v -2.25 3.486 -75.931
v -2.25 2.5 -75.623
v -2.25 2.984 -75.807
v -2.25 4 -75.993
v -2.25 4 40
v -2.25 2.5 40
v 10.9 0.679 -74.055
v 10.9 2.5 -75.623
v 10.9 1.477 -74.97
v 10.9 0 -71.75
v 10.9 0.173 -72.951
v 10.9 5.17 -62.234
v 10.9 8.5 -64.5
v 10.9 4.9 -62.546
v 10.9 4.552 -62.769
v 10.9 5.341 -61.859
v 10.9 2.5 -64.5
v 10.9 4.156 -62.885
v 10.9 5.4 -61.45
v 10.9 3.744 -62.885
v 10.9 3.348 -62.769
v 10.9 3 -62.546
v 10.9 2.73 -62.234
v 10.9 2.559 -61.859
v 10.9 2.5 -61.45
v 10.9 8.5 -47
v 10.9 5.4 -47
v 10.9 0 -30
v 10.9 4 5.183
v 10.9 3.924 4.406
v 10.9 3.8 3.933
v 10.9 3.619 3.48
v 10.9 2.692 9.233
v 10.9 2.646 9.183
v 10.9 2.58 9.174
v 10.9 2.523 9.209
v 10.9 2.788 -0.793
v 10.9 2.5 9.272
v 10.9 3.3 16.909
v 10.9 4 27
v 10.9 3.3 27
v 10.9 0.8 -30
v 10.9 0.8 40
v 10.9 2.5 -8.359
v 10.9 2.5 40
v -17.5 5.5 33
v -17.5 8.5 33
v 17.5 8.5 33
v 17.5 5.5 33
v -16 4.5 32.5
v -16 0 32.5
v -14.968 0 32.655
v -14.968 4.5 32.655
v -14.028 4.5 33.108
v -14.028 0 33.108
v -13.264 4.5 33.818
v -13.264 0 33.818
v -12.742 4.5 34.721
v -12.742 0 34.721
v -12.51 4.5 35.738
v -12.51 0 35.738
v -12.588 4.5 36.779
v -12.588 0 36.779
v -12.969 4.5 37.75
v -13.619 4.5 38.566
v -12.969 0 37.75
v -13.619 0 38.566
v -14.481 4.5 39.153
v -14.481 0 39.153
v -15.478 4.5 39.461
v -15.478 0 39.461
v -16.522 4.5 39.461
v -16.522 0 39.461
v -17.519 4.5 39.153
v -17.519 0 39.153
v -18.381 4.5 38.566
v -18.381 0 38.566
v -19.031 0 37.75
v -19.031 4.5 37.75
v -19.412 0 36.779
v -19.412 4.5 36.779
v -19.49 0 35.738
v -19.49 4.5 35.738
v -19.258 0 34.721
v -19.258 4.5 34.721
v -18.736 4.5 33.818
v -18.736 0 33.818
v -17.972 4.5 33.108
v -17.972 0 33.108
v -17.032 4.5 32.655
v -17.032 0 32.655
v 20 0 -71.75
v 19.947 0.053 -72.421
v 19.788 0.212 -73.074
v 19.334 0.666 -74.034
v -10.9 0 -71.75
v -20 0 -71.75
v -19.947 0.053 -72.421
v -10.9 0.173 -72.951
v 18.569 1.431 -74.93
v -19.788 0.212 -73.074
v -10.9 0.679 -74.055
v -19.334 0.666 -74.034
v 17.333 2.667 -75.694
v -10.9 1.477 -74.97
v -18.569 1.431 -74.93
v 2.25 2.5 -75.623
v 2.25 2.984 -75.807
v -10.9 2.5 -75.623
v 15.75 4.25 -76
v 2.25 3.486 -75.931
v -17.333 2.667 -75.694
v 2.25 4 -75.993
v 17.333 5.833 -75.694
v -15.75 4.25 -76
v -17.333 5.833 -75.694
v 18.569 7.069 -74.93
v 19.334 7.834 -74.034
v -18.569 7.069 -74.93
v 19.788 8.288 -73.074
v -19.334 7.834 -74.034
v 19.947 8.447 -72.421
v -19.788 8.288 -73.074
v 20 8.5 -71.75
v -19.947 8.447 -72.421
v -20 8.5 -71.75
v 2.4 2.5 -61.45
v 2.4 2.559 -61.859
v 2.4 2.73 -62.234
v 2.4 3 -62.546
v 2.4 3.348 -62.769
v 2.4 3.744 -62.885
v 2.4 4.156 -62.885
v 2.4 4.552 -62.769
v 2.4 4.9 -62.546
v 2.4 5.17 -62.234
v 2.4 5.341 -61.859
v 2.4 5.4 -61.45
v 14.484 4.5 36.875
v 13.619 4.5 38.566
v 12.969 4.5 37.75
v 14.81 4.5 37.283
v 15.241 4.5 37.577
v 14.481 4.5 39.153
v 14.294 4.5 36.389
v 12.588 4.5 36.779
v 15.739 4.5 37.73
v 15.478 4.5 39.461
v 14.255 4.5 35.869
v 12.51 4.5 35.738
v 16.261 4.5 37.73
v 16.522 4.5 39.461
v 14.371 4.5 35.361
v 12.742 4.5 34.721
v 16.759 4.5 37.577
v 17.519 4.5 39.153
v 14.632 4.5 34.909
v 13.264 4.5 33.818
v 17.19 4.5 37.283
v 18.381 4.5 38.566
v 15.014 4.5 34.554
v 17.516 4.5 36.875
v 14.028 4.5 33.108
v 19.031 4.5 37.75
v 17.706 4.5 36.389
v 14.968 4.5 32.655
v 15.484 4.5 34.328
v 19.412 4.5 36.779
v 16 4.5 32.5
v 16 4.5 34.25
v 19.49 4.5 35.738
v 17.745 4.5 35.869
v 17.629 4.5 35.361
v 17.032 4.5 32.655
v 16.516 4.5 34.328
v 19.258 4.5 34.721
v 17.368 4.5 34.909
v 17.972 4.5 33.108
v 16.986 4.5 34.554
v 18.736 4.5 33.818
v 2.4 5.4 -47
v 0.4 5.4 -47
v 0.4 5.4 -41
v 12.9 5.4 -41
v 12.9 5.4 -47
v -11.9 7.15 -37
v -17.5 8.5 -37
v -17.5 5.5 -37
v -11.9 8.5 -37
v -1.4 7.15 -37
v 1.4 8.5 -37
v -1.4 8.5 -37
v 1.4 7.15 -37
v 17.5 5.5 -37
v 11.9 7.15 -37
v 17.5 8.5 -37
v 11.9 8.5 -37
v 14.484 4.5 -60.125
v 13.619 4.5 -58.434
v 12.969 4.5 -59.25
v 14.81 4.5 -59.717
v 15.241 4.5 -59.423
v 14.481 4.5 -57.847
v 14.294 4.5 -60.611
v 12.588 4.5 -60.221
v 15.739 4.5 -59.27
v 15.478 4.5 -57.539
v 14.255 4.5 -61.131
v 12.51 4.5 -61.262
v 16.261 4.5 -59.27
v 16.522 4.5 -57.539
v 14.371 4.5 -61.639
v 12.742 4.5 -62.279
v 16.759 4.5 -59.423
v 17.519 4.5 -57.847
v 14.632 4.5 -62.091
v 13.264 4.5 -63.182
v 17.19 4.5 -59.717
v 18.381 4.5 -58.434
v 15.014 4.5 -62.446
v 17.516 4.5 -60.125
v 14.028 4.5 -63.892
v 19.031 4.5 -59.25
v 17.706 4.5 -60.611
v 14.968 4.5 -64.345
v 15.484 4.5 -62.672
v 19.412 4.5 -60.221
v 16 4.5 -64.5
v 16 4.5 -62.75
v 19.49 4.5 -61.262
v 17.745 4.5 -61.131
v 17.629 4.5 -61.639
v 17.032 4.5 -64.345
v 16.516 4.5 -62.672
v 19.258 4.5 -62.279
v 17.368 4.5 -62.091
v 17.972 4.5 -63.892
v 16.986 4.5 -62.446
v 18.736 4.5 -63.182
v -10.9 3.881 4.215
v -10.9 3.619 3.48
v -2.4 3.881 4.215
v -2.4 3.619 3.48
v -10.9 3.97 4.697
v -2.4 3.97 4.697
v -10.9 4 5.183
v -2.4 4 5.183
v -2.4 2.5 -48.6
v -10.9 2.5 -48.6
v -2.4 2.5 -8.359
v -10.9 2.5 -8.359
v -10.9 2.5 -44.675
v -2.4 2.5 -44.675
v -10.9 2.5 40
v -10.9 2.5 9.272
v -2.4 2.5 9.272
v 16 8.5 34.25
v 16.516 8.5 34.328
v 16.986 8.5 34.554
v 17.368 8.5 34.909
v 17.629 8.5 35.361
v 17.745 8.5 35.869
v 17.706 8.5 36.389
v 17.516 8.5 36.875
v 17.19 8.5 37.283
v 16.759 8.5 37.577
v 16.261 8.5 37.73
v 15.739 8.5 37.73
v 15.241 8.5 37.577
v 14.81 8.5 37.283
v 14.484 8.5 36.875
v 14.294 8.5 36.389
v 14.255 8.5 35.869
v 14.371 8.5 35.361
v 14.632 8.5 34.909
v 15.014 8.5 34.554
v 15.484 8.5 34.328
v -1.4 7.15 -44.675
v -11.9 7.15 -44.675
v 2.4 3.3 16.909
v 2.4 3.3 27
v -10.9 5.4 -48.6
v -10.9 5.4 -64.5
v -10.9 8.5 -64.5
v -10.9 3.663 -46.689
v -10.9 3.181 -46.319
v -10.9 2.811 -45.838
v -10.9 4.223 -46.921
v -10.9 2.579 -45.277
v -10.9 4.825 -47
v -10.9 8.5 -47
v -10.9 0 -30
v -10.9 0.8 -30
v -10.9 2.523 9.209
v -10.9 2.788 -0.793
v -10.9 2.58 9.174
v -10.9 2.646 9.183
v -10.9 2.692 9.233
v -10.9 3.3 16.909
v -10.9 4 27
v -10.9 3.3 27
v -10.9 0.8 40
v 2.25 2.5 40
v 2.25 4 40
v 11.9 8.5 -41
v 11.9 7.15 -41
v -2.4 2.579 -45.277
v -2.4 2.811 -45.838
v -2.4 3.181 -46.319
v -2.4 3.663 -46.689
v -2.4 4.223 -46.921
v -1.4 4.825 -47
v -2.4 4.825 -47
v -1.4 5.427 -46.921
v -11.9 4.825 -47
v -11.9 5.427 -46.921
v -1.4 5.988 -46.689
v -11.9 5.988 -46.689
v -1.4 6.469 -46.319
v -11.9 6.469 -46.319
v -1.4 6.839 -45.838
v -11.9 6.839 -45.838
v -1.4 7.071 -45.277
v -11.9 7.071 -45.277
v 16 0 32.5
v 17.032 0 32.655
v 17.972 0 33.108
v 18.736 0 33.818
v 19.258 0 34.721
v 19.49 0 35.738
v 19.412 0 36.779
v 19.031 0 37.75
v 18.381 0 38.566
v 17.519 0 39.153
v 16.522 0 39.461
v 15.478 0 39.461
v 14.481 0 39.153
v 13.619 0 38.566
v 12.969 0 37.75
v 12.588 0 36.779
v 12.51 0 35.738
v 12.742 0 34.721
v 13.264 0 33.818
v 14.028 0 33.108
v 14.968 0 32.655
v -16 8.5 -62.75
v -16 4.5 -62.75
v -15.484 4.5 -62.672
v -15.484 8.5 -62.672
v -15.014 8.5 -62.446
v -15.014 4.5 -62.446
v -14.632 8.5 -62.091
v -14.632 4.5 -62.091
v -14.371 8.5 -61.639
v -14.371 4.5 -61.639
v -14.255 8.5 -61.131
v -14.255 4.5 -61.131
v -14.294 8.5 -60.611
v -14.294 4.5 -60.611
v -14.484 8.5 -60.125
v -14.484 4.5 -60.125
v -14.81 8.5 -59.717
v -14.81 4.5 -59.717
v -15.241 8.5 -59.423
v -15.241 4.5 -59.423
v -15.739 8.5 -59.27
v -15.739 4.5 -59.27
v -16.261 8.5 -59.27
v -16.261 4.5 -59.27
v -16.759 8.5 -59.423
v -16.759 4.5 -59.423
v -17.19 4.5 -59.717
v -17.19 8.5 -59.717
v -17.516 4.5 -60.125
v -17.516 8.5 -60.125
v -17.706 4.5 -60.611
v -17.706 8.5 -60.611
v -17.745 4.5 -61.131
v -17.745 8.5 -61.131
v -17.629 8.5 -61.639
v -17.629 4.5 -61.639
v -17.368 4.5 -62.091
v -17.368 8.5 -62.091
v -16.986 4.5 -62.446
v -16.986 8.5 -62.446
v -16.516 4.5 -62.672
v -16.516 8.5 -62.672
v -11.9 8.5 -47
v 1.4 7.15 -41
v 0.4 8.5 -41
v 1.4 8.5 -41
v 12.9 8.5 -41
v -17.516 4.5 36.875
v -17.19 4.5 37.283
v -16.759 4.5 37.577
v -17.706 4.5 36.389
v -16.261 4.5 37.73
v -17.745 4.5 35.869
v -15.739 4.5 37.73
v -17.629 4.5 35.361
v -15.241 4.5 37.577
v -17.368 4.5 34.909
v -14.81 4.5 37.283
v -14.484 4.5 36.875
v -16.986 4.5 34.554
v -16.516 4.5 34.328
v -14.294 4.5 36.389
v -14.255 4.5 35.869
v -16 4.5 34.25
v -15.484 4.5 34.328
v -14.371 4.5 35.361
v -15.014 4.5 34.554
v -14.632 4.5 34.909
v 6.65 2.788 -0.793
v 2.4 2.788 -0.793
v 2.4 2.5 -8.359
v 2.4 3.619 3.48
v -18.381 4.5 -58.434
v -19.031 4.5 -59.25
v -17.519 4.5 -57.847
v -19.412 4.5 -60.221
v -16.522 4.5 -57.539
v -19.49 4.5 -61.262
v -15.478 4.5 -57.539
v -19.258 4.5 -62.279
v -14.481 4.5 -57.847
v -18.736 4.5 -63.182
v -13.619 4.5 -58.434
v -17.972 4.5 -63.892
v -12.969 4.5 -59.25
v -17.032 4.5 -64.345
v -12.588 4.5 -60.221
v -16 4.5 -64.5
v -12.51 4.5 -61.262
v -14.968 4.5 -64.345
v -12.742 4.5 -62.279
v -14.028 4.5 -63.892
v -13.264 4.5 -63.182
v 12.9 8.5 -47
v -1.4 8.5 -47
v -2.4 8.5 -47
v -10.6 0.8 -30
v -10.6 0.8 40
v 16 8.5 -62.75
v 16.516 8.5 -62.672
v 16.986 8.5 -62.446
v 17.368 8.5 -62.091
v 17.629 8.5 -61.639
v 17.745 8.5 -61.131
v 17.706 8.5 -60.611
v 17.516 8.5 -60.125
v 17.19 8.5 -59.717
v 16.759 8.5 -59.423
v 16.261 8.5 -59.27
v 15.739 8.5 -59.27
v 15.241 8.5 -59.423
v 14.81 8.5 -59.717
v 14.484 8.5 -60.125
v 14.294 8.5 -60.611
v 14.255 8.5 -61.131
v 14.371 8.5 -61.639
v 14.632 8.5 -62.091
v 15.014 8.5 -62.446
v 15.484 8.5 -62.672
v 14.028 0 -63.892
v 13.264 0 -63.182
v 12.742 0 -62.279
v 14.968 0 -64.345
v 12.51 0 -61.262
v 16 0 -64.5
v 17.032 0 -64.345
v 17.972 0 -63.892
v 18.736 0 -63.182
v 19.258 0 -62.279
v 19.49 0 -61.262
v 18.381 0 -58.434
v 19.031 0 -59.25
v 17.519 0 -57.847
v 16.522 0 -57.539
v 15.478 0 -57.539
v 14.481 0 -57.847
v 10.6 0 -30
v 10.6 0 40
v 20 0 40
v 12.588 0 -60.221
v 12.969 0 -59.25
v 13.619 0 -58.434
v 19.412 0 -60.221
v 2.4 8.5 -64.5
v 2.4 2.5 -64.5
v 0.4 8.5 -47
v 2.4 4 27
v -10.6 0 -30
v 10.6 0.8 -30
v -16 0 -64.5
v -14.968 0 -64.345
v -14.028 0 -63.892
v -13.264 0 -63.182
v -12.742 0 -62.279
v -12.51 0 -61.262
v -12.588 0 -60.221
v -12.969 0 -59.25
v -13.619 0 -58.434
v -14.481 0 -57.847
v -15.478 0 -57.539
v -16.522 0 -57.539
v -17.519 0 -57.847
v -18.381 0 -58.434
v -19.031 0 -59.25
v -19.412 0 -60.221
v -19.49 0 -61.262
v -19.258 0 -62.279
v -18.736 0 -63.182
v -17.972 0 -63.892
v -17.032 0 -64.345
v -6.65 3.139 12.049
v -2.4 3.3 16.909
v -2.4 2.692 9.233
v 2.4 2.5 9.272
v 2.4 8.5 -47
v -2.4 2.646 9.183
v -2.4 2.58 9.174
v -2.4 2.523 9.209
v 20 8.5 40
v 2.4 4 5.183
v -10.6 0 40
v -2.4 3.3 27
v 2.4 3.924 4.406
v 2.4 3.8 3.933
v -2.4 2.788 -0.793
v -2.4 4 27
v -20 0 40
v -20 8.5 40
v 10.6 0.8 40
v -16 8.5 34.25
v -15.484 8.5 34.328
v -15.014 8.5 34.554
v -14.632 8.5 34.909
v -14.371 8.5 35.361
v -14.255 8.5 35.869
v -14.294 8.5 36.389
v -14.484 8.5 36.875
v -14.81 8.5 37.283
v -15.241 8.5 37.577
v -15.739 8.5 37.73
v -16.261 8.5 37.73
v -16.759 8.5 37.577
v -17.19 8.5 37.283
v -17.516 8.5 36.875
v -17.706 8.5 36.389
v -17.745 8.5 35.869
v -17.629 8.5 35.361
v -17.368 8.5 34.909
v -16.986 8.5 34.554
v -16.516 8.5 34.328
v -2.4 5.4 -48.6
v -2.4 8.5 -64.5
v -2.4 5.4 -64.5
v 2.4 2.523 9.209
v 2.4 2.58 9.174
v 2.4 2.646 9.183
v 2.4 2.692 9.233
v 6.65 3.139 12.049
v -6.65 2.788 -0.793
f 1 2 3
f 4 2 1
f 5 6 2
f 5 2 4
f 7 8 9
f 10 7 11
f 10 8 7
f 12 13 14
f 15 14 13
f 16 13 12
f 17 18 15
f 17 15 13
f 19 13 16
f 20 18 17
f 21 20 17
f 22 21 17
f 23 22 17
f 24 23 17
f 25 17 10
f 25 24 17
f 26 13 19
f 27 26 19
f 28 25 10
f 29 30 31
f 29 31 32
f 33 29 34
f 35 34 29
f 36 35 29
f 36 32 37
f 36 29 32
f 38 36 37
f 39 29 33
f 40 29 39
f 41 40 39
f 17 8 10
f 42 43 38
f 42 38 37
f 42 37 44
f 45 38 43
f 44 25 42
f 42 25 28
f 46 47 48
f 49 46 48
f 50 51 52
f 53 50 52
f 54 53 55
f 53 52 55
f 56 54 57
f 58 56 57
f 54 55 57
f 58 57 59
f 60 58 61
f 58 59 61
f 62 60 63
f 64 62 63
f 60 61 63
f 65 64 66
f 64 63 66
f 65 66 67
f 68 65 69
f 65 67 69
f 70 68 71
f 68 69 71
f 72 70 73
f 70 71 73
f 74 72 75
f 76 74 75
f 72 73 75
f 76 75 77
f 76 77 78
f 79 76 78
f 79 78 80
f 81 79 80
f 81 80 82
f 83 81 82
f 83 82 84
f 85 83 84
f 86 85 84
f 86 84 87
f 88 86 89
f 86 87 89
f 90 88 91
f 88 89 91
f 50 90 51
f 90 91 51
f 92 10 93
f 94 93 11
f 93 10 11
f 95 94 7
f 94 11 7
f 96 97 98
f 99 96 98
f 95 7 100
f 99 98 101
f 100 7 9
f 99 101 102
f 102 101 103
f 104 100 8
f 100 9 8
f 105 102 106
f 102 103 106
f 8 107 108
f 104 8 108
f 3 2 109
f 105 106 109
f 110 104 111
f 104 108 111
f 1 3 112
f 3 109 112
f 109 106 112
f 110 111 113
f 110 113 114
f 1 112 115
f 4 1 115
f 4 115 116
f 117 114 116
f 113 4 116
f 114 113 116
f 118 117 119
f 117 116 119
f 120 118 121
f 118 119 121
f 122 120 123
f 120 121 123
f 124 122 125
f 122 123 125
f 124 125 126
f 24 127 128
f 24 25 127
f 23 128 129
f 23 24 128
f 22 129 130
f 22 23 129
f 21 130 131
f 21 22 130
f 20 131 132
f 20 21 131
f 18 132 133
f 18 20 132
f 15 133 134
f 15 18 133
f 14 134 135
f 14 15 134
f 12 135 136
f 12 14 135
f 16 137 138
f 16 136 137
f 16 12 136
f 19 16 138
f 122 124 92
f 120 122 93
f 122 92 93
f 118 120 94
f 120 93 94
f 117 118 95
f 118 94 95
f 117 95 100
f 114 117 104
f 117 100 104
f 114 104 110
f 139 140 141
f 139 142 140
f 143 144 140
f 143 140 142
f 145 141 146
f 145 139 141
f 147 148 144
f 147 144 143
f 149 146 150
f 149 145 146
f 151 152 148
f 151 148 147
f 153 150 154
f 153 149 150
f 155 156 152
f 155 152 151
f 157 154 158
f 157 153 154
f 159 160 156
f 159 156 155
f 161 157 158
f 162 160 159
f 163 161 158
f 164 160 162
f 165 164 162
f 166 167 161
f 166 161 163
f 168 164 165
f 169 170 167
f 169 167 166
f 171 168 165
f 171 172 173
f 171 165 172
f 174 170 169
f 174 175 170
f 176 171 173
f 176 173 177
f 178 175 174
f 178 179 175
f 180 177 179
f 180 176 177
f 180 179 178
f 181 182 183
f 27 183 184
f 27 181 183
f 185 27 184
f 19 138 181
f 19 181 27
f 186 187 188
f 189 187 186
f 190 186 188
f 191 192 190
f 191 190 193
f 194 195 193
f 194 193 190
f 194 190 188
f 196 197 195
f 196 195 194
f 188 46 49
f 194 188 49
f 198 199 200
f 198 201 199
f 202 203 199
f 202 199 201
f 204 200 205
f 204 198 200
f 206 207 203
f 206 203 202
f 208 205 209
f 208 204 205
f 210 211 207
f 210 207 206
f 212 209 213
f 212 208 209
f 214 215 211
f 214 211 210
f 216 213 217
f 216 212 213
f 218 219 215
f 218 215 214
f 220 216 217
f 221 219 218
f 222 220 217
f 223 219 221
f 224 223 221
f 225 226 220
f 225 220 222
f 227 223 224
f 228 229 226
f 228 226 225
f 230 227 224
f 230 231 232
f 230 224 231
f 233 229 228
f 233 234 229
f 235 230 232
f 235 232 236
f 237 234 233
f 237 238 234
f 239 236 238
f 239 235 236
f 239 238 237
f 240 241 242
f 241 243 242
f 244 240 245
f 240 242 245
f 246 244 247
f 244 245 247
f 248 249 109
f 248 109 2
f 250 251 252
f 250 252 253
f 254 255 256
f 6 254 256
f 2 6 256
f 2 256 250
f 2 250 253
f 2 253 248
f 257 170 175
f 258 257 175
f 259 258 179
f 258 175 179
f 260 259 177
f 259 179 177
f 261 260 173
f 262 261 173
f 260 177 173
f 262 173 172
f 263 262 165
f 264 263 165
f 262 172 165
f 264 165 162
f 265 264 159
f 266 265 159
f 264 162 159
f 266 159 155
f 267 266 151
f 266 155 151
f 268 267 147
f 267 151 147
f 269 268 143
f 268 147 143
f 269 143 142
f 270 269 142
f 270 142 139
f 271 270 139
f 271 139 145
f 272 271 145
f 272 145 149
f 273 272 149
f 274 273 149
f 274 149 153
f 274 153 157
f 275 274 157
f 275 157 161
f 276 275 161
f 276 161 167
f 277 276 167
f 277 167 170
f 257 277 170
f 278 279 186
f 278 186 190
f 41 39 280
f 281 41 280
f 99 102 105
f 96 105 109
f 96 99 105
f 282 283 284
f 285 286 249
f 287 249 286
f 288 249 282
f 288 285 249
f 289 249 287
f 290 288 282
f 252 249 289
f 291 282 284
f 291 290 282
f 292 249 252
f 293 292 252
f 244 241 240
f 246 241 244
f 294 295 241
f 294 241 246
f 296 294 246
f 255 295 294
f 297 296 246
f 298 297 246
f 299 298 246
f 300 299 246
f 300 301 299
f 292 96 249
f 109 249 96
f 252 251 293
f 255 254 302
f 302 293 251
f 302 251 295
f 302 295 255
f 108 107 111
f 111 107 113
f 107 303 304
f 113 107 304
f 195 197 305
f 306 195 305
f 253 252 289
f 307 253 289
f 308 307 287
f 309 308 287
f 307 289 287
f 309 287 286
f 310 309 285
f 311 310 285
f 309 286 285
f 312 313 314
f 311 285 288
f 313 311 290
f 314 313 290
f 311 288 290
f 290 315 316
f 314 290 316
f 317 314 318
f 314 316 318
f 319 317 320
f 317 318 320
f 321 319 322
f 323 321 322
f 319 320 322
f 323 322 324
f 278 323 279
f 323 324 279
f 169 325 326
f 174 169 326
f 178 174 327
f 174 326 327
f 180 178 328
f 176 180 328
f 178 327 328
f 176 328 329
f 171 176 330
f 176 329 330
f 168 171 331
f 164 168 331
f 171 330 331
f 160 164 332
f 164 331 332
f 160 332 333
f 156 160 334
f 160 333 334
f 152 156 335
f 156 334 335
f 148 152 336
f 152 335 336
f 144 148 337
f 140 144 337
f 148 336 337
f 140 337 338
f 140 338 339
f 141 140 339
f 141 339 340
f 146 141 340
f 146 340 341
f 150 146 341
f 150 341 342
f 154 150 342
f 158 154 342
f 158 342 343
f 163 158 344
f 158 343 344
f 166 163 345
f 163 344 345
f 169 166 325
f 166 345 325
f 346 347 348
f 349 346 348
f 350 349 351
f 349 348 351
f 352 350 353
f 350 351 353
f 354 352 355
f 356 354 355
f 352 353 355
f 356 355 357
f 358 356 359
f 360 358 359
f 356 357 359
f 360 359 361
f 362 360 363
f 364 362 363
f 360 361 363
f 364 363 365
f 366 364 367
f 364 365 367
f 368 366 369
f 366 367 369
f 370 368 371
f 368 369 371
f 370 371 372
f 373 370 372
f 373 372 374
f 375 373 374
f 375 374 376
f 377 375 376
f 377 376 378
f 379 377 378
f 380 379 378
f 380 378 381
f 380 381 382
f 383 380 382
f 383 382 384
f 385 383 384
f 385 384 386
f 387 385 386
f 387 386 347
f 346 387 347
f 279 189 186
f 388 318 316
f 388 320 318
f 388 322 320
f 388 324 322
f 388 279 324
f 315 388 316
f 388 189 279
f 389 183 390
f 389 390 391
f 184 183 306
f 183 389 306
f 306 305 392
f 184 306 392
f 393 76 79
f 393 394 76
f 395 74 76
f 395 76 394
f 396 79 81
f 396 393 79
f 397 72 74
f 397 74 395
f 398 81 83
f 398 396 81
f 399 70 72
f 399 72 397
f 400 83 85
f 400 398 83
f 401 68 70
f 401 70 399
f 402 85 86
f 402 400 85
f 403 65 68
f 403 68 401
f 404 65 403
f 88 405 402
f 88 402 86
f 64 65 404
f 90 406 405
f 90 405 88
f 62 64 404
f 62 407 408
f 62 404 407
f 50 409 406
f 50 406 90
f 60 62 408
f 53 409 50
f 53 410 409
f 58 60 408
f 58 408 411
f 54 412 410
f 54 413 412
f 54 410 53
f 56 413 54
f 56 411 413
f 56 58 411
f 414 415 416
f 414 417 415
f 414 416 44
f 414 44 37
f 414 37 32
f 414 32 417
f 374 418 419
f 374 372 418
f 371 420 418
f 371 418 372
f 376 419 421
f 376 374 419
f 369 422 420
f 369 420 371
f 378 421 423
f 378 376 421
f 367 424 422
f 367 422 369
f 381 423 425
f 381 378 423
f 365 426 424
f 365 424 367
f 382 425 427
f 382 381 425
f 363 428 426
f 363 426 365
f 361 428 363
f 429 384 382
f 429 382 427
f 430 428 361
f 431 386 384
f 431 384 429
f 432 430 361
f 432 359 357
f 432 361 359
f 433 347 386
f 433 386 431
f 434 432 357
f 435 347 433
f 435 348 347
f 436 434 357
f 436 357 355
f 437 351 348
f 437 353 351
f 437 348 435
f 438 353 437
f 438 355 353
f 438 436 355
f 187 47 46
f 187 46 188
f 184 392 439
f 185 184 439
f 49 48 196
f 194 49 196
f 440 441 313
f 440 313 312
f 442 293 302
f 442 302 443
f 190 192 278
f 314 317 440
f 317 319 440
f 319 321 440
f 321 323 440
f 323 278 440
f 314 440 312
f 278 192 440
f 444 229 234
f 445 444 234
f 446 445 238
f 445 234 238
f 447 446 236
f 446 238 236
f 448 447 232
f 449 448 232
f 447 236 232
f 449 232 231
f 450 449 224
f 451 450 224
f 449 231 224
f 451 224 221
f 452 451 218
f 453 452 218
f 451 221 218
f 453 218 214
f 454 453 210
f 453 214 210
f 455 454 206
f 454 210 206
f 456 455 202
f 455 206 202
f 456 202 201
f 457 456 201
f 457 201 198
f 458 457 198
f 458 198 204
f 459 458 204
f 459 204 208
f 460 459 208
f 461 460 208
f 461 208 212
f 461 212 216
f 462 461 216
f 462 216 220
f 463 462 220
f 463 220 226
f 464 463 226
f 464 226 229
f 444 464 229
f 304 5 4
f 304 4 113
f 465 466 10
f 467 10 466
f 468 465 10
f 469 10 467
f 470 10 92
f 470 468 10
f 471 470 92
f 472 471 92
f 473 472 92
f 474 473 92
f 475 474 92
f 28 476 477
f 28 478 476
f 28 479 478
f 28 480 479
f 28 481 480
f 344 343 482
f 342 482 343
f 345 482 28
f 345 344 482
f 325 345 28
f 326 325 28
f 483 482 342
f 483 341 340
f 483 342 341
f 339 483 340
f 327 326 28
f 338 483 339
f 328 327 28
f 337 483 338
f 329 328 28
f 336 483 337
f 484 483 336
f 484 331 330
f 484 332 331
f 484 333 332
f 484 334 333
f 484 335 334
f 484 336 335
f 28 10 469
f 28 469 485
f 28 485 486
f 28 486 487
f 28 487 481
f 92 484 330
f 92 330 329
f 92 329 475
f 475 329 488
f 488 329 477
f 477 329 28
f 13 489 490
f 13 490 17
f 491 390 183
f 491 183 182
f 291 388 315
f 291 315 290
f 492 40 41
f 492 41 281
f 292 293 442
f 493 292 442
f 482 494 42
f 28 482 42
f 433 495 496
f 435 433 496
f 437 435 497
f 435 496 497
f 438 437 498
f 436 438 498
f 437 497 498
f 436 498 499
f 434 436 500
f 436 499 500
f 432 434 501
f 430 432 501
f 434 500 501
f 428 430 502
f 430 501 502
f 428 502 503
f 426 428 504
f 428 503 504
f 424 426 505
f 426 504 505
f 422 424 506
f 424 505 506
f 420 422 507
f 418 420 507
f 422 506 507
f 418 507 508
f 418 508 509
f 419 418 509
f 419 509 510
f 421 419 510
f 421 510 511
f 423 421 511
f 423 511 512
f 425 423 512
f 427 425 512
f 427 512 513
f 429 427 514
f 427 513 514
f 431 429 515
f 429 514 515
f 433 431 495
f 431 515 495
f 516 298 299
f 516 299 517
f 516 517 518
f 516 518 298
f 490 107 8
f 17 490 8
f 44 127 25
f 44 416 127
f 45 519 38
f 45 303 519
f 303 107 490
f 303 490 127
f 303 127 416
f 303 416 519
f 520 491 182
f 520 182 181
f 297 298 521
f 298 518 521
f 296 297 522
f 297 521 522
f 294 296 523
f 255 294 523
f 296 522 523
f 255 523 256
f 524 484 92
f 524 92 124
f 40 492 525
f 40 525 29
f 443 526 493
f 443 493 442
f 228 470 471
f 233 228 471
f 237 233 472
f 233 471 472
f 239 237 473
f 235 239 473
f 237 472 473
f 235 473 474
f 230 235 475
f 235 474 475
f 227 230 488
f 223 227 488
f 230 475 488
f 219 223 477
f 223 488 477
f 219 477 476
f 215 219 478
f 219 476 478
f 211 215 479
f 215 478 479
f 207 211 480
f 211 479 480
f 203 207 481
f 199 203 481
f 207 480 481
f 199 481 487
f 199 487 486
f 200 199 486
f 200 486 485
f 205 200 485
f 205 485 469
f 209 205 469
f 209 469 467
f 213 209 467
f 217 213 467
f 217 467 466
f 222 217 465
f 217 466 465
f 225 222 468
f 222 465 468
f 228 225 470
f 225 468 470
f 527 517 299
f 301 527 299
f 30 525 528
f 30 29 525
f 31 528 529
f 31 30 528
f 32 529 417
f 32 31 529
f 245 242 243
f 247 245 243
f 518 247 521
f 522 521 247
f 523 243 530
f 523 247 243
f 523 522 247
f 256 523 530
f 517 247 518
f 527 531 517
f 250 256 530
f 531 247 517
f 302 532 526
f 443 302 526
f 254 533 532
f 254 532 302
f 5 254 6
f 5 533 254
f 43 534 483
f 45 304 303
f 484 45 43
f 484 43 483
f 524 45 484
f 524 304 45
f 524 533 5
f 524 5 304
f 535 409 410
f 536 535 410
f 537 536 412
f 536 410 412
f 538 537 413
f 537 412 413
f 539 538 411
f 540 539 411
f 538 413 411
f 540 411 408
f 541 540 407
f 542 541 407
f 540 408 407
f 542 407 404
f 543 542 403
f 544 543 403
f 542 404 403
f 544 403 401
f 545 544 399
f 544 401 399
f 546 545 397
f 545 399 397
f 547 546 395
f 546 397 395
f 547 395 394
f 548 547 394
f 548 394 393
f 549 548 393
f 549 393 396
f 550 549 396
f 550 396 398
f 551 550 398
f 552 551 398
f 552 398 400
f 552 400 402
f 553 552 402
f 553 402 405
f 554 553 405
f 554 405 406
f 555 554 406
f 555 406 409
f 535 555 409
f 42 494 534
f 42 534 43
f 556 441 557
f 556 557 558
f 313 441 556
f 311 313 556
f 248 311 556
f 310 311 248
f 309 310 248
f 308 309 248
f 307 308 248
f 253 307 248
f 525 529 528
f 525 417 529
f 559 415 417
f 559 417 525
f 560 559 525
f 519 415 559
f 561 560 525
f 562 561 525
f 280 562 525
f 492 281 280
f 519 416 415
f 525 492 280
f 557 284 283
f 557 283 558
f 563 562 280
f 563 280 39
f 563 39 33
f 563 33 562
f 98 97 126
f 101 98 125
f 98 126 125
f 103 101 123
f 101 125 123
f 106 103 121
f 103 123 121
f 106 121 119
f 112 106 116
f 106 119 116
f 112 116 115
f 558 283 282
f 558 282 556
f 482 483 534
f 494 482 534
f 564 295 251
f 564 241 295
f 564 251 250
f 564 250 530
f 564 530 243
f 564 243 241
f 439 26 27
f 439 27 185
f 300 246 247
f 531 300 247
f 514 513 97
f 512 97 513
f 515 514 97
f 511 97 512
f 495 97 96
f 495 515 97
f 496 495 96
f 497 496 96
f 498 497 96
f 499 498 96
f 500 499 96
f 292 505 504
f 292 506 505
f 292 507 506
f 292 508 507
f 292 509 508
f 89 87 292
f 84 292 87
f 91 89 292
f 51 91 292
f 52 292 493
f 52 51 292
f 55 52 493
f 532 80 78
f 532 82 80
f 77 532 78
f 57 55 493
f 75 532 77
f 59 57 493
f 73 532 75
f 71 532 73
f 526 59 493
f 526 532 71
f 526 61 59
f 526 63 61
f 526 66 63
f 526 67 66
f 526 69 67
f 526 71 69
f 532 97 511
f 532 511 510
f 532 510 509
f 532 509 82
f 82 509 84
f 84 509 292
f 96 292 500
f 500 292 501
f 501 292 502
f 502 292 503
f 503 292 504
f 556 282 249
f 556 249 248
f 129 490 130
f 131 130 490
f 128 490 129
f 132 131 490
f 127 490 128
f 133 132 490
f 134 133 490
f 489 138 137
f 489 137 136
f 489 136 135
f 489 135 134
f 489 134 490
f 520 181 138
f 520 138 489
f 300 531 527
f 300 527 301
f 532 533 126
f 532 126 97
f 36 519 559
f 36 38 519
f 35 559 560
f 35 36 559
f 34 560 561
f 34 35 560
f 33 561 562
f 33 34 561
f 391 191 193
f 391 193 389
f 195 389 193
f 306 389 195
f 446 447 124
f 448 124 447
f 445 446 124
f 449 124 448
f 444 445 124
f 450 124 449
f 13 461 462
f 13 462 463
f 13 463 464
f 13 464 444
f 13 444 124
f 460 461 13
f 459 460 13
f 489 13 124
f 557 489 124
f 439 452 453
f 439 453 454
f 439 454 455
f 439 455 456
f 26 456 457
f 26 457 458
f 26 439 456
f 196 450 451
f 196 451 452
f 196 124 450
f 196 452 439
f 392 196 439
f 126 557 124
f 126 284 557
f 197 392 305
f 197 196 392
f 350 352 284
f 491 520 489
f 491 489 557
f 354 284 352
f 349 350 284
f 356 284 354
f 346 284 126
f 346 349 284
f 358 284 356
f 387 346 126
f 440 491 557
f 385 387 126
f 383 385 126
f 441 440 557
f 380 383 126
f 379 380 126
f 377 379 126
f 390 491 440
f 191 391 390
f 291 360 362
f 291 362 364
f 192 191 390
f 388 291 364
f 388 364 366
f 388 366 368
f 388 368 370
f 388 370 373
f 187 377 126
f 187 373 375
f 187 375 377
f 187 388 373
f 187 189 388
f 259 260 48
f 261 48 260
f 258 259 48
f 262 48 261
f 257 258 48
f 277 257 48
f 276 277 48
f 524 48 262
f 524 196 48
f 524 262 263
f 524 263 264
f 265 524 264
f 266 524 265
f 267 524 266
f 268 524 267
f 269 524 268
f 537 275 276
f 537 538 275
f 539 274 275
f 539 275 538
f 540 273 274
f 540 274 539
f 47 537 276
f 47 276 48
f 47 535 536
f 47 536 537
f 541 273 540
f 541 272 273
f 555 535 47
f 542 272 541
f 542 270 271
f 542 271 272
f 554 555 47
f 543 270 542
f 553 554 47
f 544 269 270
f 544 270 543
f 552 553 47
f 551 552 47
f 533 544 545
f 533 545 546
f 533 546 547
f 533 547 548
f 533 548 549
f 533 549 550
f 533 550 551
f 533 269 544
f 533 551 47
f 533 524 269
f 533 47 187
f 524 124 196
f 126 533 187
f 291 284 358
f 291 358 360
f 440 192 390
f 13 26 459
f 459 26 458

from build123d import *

# Parameters (mm, degrees)
SKETCH1_W                  = 40
SKETCH1_H                  = 106
BOSS_EXTRUDE1_DEPTH        = 8.5
SKETCH2_W                  = 35
SKETCH2_H                  = 70
CUT_EXTRUDE1_DEPTH         = 3
SKETCH3_W                  = 10.5
SKETCH3_H                  = 10
CUT_EXTRUDE2_DEPTH         = 1.35
SKETCH4_W                  = 12.5
SKETCH4_H                  = 6
CUT_EXTRUDE3_DEPTH         = 3.1
SKETCH5_W                  = 8.5
SKETCH5_H                  = 17.5
PCB_PLACE_DEPTH            = 3.1
SKETCH6_W                  = 8.5
SKETCH6_H                  = 1.6
NICKEL_STRIP_HOLE_DEPTH    = 70.174850921
CUT_EXTRUDE4_REACH         = 71.486
SKETCH7_W                  = 8.5
SKETCH7_H                  = 17.5
SKETCH8_W                  = 8.5
SKETCH8_H                  = 1.6
CUT_EXTRUDE5_DEPTH         = 10
SKETCH9_W                  = 8.5
SKETCH9_H                  = 106
NICKEL_STRIP_RAIL_DEPTH    = 2.5
FILLET3_R                  = 2.325
FILLET4_RADIUS             = 1.45
FILLET4_LENGTH             = 8.5
SKETCH10_W                 = 8.5
SKETCH10_H                 = 5
CUT_EXTRUDE6_DEPTH         = 1.5
SKETCH11_W                 = 8.5
SKETCH11_H                 = 0.7
NICKELSTRIPINSERTION_DEPTH = 18
FILLET5_INSERTION_START    = -10.9
FILLET5_INSERTION_DEPTH    = 8.5
FILLET5_INSERTION_START_2  = 2.4
FILLET5_INSERTION_2_DEPTH  = 8.5
FILLET7_AMEND_R            = 4
FILLET6_START              = -10.9
FILLET6_DEPTH              = 8.5
FILLET6_START_2            = 2.4
FILLET6_2_DEPTH            = 8.5
FILLET8_ROUNDING_R         = 0.1
SKETCH12_W                 = 0.3
SKETCH12_H                 = 0.8
STRIPRAIL_DEPTH            = 70
SKETCH13_R                 = 1.75
SCREW_HOLES_DEPTH          = 70.485610128
SKETCH14_R                 = 3.5
SCREW_HEAD_HOLES_TBM_DEPTH = 4.5
BOSS_EXTRUDE2_DEPTH        = 10
FILLET9_R                  = 4.25
CUT_EXTRUDE7_REACH         = 120.018
SKETCH17_W                 = 4.5
SKETCH17_H                 = 4
CUT_EXTRUDE8_REACH         = 120.018
SKETCH18_W                 = 5.4
SKETCH18_H                 = 2.5


with BuildPart() as part:
    # Sketch1 → Boss-Extrude1 (new body)
    with BuildSketch(Plane(origin=(0, 0, 0), x_dir=(1, 0, 0), z_dir=(0, 1, 0))):
        with Locations((0, 13)):
            Rectangle(SKETCH1_W, SKETCH1_H)
    extrude(amount=BOSS_EXTRUDE1_DEPTH)

    # Sketch2 → Cut-Extrude1 (cut)
    with BuildSketch(Plane(origin=(0, 8.5, 0), x_dir=(1, 0, 0), z_dir=(0, 1, 0))):
        with Locations((0, 2)):
            Rectangle(SKETCH2_W, SKETCH2_H)
    extrude(amount=-CUT_EXTRUDE1_DEPTH, mode=Mode.SUBTRACT)

    # Sketch3 → Cut-Extrude2 (cut)
    with BuildSketch(Plane(origin=(0, 8.5, 0), x_dir=(1, 0, 0), z_dir=(0, 1, 0))):
        with Locations((-6.65, 42)):
            Rectangle(SKETCH3_W, SKETCH3_H)
        with Locations((6.65, 42)):
            Rectangle(SKETCH3_W, SKETCH3_H)
    extrude(amount=-CUT_EXTRUDE2_DEPTH, mode=Mode.SUBTRACT)

    # Sketch4 → Cut-Extrude3 (cut)
    with BuildSketch(Plane(origin=(0, 8.5, 0), x_dir=(1, 0, 0), z_dir=(0, 1, 0))):
        with Locations((6.65, 44)):
            Rectangle(SKETCH4_W, SKETCH4_H)
    extrude(amount=-CUT_EXTRUDE3_DEPTH, mode=Mode.SUBTRACT)

    # Sketch5 → PCB place (cut)
    with BuildSketch(Plane(origin=(0, 8.5, 0), x_dir=(1, 0, 0), z_dir=(0, 1, 0))):
        with Locations((6.65, 55.75)):
            Rectangle(SKETCH5_W, SKETCH5_H)
    extrude(amount=-PCB_PLACE_DEPTH, mode=Mode.SUBTRACT)

    # Sketch6 → Nickel strip hole (cut, through all)
    with BuildSketch(Plane(origin=(0, 5.4, 0), x_dir=(1, 0, 0), z_dir=(0, 1, 0))):
        with Locations((6.65, 63.7)):
            Rectangle(SKETCH6_W, SKETCH6_H)
    extrude(amount=-NICKEL_STRIP_HOLE_DEPTH, mode=Mode.SUBTRACT)

    # Cut-Extrude4: up to this face of the body (flat: up to its plane)
    cut_extrude4_end = Plane(part.part.faces().sort_by_distance((6.65, 5.4, -51.042077088))[0])
    # Sketch7 → Cut-Extrude4 (cut, up to the picked face)
    with BuildSketch(Plane(origin=(0, 8.5, 0), x_dir=(1, 0, 0), z_dir=(0, 1, 0)), mode=Mode.PRIVATE) as cut_extrude4_sk1:
        with Locations((-6.65, 55.75)):
            Rectangle(SKETCH7_W, SKETCH7_H)
    cut_extrude4_tool1 = split(extrude(cut_extrude4_sk1.sketch, amount=-CUT_EXTRUDE4_REACH, mode=Mode.PRIVATE), bisect_by=cut_extrude4_end, keep=Keep.BOTH, mode=Mode.PRIVATE)
    add(cut_extrude4_tool1.solids().sort_by(Axis((-6.65, 8.5, -55.75), (0, -1, 0)))[0], mode=Mode.SUBTRACT)

    # Sketch8 → Cut-Extrude5 (cut)
    with BuildSketch(Plane(origin=(0, 5.4, 0), x_dir=(1, 0, 0), z_dir=(0, 1, 0))):
        with Locations((-6.65, 47.8)):
            Rectangle(SKETCH8_W, SKETCH8_H)
    extrude(amount=-CUT_EXTRUDE5_DEPTH, mode=Mode.SUBTRACT)

    # Sketch9 → Nickel strip rail (cut)
    with BuildSketch(Plane.XZ):
        with Locations((-6.65, -13)):
            Rectangle(SKETCH9_W, SKETCH9_H)
        with Locations((6.65, -13)):
            Rectangle(SKETCH9_W, SKETCH9_H)
    extrude(amount=-NICKEL_STRIP_RAIL_DEPTH, mode=Mode.SUBTRACT)

    # Fillet3
    # the kernel refuses this fillet: 2.325 mm, written as the material it takes off along each edge
    with BuildSketch(Plane(origin=(3.4125, 7.15, -47), x_dir=(0, 0, 1), z_dir=(-1, 0, 0))) as fillet3_piece_1_section:
        with BuildLine():
            CenterArc((FILLET3_R, -FILLET3_R), FILLET3_R, 90, 90)
            Line((0, -FILLET3_R), (0, 0))
            Line((0, 0), (FILLET3_R, 0))
        make_face()
    fillet3_piece_1 = extrude(amount=20.125, mode=Mode.PRIVATE)
    fillet3_piece_1 = split(fillet3_piece_1, bisect_by=Plane(origin=(-11.9, 7.15, -47), z_dir=(1, 0, 0)), keep=Keep.TOP, mode=Mode.PRIVATE)
    fillet3_piece_1 = split(fillet3_piece_1, bisect_by=Plane(origin=(-1.4, 7.15, -47), z_dir=(-1, 0, 0)), keep=Keep.TOP, mode=Mode.PRIVATE)
    add(fillet3_piece_1, mode=Mode.SUBTRACT)
    with BuildSketch(Plane(origin=(-10.9, 2.5, -47), x_dir=(0, 1, 0), z_dir=(1, 0, 0))) as fillet3_piece_2:
        with BuildLine():
            CenterArc((FILLET3_R, FILLET3_R), FILLET3_R, 180, 90)
            Line((0, FILLET3_R), (0, 0))
            Line((0, 0), (FILLET3_R, 0))
        make_face()
    extrude(amount=8.5, mode=Mode.SUBTRACT)

    # Fillet4: full round fillet: the end face becomes a half cylinder, R = half its width
    fillet4_face = Plane((6.65, 3.95, -62.9), x_dir=(1, 0, 0), z_dir=(0, 0, -1))  # on the end face: x along it, z out of the body
    fillet4_slab = fillet4_face.offset(-FILLET4_RADIUS / 2) * Box(FILLET4_LENGTH, 2 * FILLET4_RADIUS, FILLET4_RADIUS, mode=Mode.PRIVATE)  # the body's end, R deep
    fillet4_round = Plane((6.65, 3.95, -61.45), x_dir=(0, 0, -1), z_dir=(1, 0, 0)) * Cylinder(FILLET4_RADIUS, FILLET4_LENGTH, mode=Mode.PRIVATE)  # its axis R under the face
    add(fillet4_slab - fillet4_round, mode=Mode.SUBTRACT)

    # Sketch10 → Cut-Extrude6 (cut)
    with BuildSketch(Plane.XZ.offset(-2.5)):
        with Locations((6.65, 6.5)):
            Rectangle(SKETCH10_W, SKETCH10_H)
        with Locations((-6.65, 6.5)):
            Rectangle(SKETCH10_W, SKETCH10_H)
    extrude(amount=-CUT_EXTRUDE6_DEPTH, mode=Mode.SUBTRACT)

    # Sketch11 → NickelStripInsertion (cut)
    with BuildSketch(Plane(origin=(0, 0, 9), x_dir=(-1, 0, 0), z_dir=(0, 0, -1))):
        with Locations((-6.65, 3.65)):
            Rectangle(SKETCH11_W, SKETCH11_H)
        with Locations((6.65, 3.65)):
            Rectangle(SKETCH11_W, SKETCH11_H)
    extrude(amount=-NICKELSTRIPINSERTION_DEPTH, mode=Mode.SUBTRACT)

    # Fillet5_insertion: read off the stored shape, not the designer's step
    # Fillet5_insertion outline → Fillet5_insertion (cut)
    with BuildSketch(Plane.YZ.offset(FILLET5_INSERTION_START)):
        with BuildLine():
            Line((2.5, 4), (2.5, -8.359207094))
            add(Edge.make_bspline(
                [(2.5, -8.359207094), (2.5, 2.968380423), (4, 4)],
                knots=[0, 0, 0, 1, 1, 1], degree=2, weights=[1, 0.885061203, 1]))
            Line((4, 4), (2.5, 4))
        make_face()
    extrude(amount=FILLET5_INSERTION_DEPTH, mode=Mode.SUBTRACT)

    # Fillet5_insertion 2 outline → Fillet5_insertion 2 (cut)
    with BuildSketch(Plane.YZ.offset(FILLET5_INSERTION_START_2)):
        with BuildLine():
            Line((2.5, 4), (2.5, -8.359207094))
            add(Edge.make_bspline(
                [(2.5, -8.359207094), (2.5, 2.968380423), (4, 4)],
                knots=[0, 0, 0, 1, 1, 1], degree=2, weights=[1, 0.885061203, 1]))
            Line((4, 4), (2.5, 4))
        make_face()
    extrude(amount=FILLET5_INSERTION_2_DEPTH, mode=Mode.SUBTRACT)

    # Fillet7_amend
    fillet7_amend_edges = [part.edges().sort_by_distance(p)[0] for p in [
        (6.65, 4, 4),
        (-6.65, 4, 4),
    ]]
    fillet(fillet7_amend_edges, radius=FILLET7_AMEND_R)

    # Fillet6: read off the stored shape, not the designer's step
    # Fillet6 outline → Fillet6 (cut)
    with BuildSketch(Plane.YZ.offset(FILLET6_START)):
        with BuildLine():
            Line((3.3, 9), (3.3, 16.909487973))
            add(Edge.make_bspline(
                [(3.3, 16.909487973), (3.3, 9.121373217), (2.5, 9)],
                knots=[0, 0, 0, 1, 1, 1], degree=2, weights=[1, 0.758287544, 1]))
            Line((2.5, 9), (3.3, 9))
        make_face()
    extrude(amount=FILLET6_DEPTH, mode=Mode.SUBTRACT)

    # Fillet6 2 outline → Fillet6 2 (cut)
    with BuildSketch(Plane.YZ.offset(FILLET6_START_2)):
        with BuildLine():
            Line((3.3, 9), (3.3, 16.909487973))
            add(Edge.make_bspline(
                [(3.3, 16.909487973), (3.3, 9.121373217), (2.5, 9)],
                knots=[0, 0, 0, 1, 1, 1], degree=2, weights=[1, 0.758287544, 1]))
            Line((2.5, 9), (3.3, 9))
        make_face()
    extrude(amount=FILLET6_2_DEPTH, mode=Mode.SUBTRACT)

    # Fillet8_rounding
    fillet8_rounding_edges = [part.edges().sort_by_distance(p)[0] for p in [
        (-6.65, 2.5, 9),
        (6.65, 2.5, 9),
    ]]
    fillet(fillet8_rounding_edges, radius=FILLET8_ROUNDING_R)

    # Sketch12 → StripRail (add)
    with BuildSketch(Plane.XY.offset(40)):
        with Locations((2.55, 0.4)):
            Rectangle(SKETCH12_W, SKETCH12_H)
        with Locations((-10.75, 0.4)):
            Rectangle(SKETCH12_W, SKETCH12_H)
        with Locations((-2.55, 0.4)):
            Rectangle(SKETCH12_W, SKETCH12_H)
        with Locations((10.75, 0.4)):
            Rectangle(SKETCH12_W, SKETCH12_H)
    extrude(amount=-STRIPRAIL_DEPTH)

    # Sketch13 → Screw_Holes (cut, through all)
    with BuildSketch(Plane.XZ):
        with Locations(Location((-16, -61, 0), (0, 0, 270))):
            Circle(SKETCH13_R)
        with Locations(Location((16, -61, 0), (0, 0, 270))):
            Circle(SKETCH13_R)
        with Locations(Location((-16, 36, 0), (0, 0, 270))):
            Circle(SKETCH13_R)
        with Locations(Location((16, 36, 0), (0, 0, 270))):
            Circle(SKETCH13_R)
    extrude(amount=-SCREW_HOLES_DEPTH, mode=Mode.SUBTRACT)

    # Sketch14 → Screw_Head_Holes_TBM (cut)
    with BuildSketch(Plane.XZ):
        with Locations(Location((16, -61, 0), (0, 0, 270))):
            Circle(SKETCH14_R)
        with Locations(Location((-16, -61, 0), (0, 0, 270))):
            Circle(SKETCH14_R)
        with Locations(Location((16, 36, 0), (0, 0, 270))):
            Circle(SKETCH14_R)
        with Locations(Location((-16, 36, 0), (0, 0, 270))):
            Circle(SKETCH14_R)
    extrude(amount=-SCREW_HEAD_HOLES_TBM_DEPTH, mode=Mode.SUBTRACT)

    # Sketch15 → Boss-Extrude2 (add)
    with BuildSketch(Plane(origin=(0, 0, -66), x_dir=(-1, 0, 0), z_dir=(0, 0, -1))):
        Polygon((-20, 0), (-20, 8.5), (20, 8.5), (20, 0), (10.9, 0), (10.9, 2.5), (2.4, 2.5), (2.4, 0), (-2.4, 0), (-2.4, 2.5), (-10.9, 2.5), (-10.9, 0), align=None)
    extrude(amount=BOSS_EXTRUDE2_DEPTH)

    # Fillet9
    # the kernel refuses this fillet: 4.25 mm, written as the material it takes off along each edge
    with BuildSketch(Plane(origin=(0.275, 0, -76), x_dir=(0, 0, 1), z_dir=(1, 0, 0))) as fillet9_piece_1:
        with BuildLine():
            CenterArc((FILLET9_R, -FILLET9_R), FILLET9_R, 90, 90)
            Line((0, -FILLET9_R), (0, 0))
            Line((0, 0), (FILLET9_R, 0))
        make_face()
    extrude(amount=30.35, mode=Mode.SUBTRACT)
    with BuildSketch(Plane(origin=(-13.025, 0, -76), x_dir=(0, 0, 1), z_dir=(1, 0, 0))) as fillet9_piece_2:
        with BuildLine():
            CenterArc((FILLET9_R, -FILLET9_R), FILLET9_R, 90, 90)
            Line((0, -FILLET9_R), (0, 0))
            Line((0, 0), (FILLET9_R, 0))
        make_face()
    extrude(amount=26.05, mode=Mode.SUBTRACT)
    with BuildSketch(Plane(origin=(-30.625, 0, -76), x_dir=(0, 1, 0), z_dir=(1, 0, 0))) as fillet9_piece_3:
        with BuildLine():
            CenterArc((FILLET9_R, FILLET9_R), FILLET9_R, 180, 90)
            Line((0, FILLET9_R), (0, 0))
            Line((0, 0), (FILLET9_R, 0))
        make_face()
    extrude(amount=30.35, mode=Mode.SUBTRACT)
    with BuildSketch(Plane(origin=(-20, 19.125, -76), x_dir=(0, 0, 1), z_dir=(0, -1, 0)), Plane(origin=(20, -10.625, -76), x_dir=(0, 0, 1), z_dir=(0, 1, 0))) as fillet9_piece_4:
        with BuildLine():
            CenterArc((FILLET9_R, -FILLET9_R), FILLET9_R, 90, 90)
            Line((0, -FILLET9_R), (0, 0))
            Line((0, 0), (FILLET9_R, 0))
        make_face()
    extrude(amount=29.75, mode=Mode.SUBTRACT)
    with BuildSketch(Plane(origin=(30.625, 8.5, -76), x_dir=(0, 0, 1), z_dir=(-1, 0, 0))) as fillet9_piece_5:
        with BuildLine():
            CenterArc((FILLET9_R, -FILLET9_R), FILLET9_R, 90, 90)
            Line((0, -FILLET9_R), (0, 0))
            Line((0, 0), (FILLET9_R, 0))
        make_face()
    extrude(amount=61.25, mode=Mode.SUBTRACT)

    # Sketch17 → Cut-Extrude7 (cut, up to next)
    with BuildSketch(Plane.XY.offset(40), mode=Mode.PRIVATE) as cut_extrude7_sk1:
        with Locations((0, 2)):
            Rectangle(SKETCH17_W, SKETCH17_H)
    cut_extrude7_tool1 = extrude(cut_extrude7_sk1.sketch, amount=-CUT_EXTRUDE7_REACH, mode=Mode.PRIVATE) & part.part
    add(cut_extrude7_tool1.solids().sort_by_distance((0, 2, 40))[0], mode=Mode.SUBTRACT)

    # Sketch18 → Cut-Extrude8 (cut, up to next)
    with BuildSketch(Plane.XY.offset(40), mode=Mode.PRIVATE) as cut_extrude8_sk1:
        with Locations((0, 1.25)):
            Rectangle(SKETCH18_W, SKETCH18_H)
    cut_extrude8_tool1 = extrude(cut_extrude8_sk1.sketch, amount=-CUT_EXTRUDE8_REACH, mode=Mode.PRIVATE) & part.part
    add(cut_extrude8_tool1.solids().sort_by_distance((0, 1.25, 40))[0], mode=Mode.SUBTRACT)
    add(cut_extrude8_tool1.solids().sort_by_distance((0, 1.25, 40))[1], mode=Mode.SUBTRACT)


solid = part.part
